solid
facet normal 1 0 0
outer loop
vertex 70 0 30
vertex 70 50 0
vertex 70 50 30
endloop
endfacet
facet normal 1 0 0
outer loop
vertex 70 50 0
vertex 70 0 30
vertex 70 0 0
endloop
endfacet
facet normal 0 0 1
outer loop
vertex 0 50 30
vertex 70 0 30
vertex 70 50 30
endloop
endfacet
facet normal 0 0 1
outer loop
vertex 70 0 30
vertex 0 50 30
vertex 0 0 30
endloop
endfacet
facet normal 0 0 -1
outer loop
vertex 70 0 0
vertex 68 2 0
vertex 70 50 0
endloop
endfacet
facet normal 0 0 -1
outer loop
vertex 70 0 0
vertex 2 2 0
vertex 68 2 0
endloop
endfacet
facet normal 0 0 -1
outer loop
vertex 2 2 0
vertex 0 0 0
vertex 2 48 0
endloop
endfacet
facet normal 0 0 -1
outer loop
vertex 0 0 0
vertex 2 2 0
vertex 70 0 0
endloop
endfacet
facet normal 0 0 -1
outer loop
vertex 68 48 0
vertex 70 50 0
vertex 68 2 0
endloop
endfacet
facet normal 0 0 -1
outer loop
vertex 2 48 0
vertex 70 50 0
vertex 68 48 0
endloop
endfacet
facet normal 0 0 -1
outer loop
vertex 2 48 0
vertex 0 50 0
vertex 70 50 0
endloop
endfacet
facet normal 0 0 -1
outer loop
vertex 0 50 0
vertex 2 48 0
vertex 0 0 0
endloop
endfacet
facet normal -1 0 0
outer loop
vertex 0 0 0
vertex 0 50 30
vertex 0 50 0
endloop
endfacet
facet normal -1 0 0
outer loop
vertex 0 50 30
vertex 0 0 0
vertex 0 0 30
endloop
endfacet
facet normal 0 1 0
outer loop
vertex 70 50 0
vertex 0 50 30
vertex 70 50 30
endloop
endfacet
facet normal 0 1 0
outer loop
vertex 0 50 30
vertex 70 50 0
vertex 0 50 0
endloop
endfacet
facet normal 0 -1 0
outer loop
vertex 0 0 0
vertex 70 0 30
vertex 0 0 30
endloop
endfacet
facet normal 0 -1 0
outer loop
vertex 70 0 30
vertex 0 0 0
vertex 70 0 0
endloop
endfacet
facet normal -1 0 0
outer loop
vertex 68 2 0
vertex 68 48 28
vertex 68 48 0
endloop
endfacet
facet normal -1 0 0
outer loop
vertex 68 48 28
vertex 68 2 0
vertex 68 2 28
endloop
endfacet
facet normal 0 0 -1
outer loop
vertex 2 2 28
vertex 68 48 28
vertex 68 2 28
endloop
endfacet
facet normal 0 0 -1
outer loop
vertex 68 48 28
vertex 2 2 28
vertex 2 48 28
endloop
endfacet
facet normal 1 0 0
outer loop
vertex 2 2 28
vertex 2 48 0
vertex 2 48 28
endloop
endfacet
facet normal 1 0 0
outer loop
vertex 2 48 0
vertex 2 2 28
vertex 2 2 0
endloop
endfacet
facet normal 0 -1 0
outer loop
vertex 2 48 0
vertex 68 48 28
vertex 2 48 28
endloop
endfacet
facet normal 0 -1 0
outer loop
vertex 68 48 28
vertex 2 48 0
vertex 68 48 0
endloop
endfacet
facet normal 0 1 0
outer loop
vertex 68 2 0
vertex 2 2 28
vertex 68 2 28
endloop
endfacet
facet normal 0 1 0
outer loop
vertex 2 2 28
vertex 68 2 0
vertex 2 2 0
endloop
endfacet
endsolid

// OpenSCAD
// Two-part enclosure for small electronics board
// Part 1: Box (left)
// Part 2: Lid (right, printed upside down)
// Prints together with a 10 mm gap.

$fn = 64;

// --- Dimensions ---

// Part 1: Box
// Outer dimensions (X x Y x Z)
BOX_OUT_X = 70;
BOX_OUT_Y = 50;
BOX_OUT_Z = 30;
// Wall thicknesses
BOX_WALL_THICK = 2;
BOX_FLOOR_THICK = 2;

// Part 2: Lid
// Base plate dimensions
LID_PLATE_X = 70;
LID_PLATE_Y = 50;
LID_PLATE_THICK = 2;
// Lip dimensions (outer size of the lip)
LIP_OUT_X = 65.6;
LIP_OUT_Y = 45.6;
LIP_THICK = 1.5;
LIP_HEIGHT = 4;
// Clearance check (calculated from outer sizes)
// Box inner X = 70 - 2*2 = 66. Lip outer X = 65.6. Clearance = (66 - 65.6)/2 = 0.2 mm.
// Box inner Y = 50 - 2*2 = 46. Lip outer Y = 45.6. Clearance = (46 - 45.6)/2 = 0.2 mm.

// --- Layout ---
// Gap between parts
PART_GAP = 10;

// --- Part 1: The Box ---
// Position: Centered on origin in X, Y, Z=0.
// Since it's open top, we build the floor and walls.
// We use difference to subtract the empty interior.

translate([0, 0, 0])
difference() {
    // 1. The solid block representing the outer volume
    cube([BOX_OUT_X, BOX_OUT_Y, BOX_OUT_Z], center = false);
    
    // 2. The empty interior to subtract
    // Inner dimensions:
    // X: 70 - 2*2 = 66
    // Y: 50 - 2*2 = 46
    // Z: 30 - 2 (floor) = 28 (open top)
    translate([
        BOX_WALL_THICK, 
        BOX_WALL_THICK, 
        0 // Floor is at Z=0, so empty space starts at Z=0
    ])
    cube([
        BOX_OUT_X - (2 * BOX_WALL_THICK),
        BOX_OUT_Y - (2 * BOX_WALL_THICK),
        BOX_OUT_Z - BOX_FLOOR_THICK
    ]);
}

// --- Part 2: The Lid ---
// Position: On the +X side of the box.
// Box center X = 35. Box right edge = 70.
// Lid left edge = 70 + 10 = 80.
// Lid center X = 80 + (70/2) = 115.
// Lid is printed upside down: It rests on the bed (Z=0).
// The "plate" is the bottom face (Z=0 to Z=2).
// The "lip" is on top of the plate (Z=2 to Z=6), but since it's upside down, 
// the lip physically sits on the bed? 
// Re-reading prompt: "a plate 70 x 50 x 2 mm lying on the bed, with a rectangular lip on top of it".
// If printed upside down, the "top" of the geometry (where the lip is) is facing the bed?
// No, "printed upside down" usually means the part is inverted relative to its design orientation.
// Design: Plate on bottom, lip on top.
// Print: Plate on top (facing Z+), lip on bottom (facing Z-)? 
// OR: The user wants the part to sit on the bed such that the lip is the bottom-most feature?
// Let's interpret "printed upside down" as: The geometry is flipped vertically.
// Original Design: Plate at Z=0..2, Lip at Z=2..6.
// Upside Down Design: Lip at Z=0..4, Plate at Z=4..6.
// BUT the prompt says: "a plate 70 x 50 x 2 mm lying on the bed".
// This implies the plate is the contact surface with the bed.
// If the plate is on the bed, and there is a lip "on top of it", then the lip is at Z=2..6.
// This contradicts "printed upside down" if the design was plate-bottom.
// Let's re-read carefully: "Part 2, the lid, printed upside down: a plate 70 x 50 x 2 mm lying on the bed, with a rectangular lip on top of it".
// This describes the physical state on the bed.
// Plate is at Z=0. Lip is at Z=2 (thickness 1.5) + height 4 = Z=5.5?
// Wait, "lip on top of it".
// If the plate is on the bed, the lip is above the plate.
// Why "printed upside down"? Maybe the design file usually has the lip on the bottom (for a snap fit)?
// Regardless, the instruction describes the geometry on the bed:
// 1. Plate (70x50x2) at Z=0.
// 2. Lip (1.5 thick wall, 4 tall) on top of the plate.
// 3. Lip outer size 65.6 x 45.6.
// 4. Lip is centred on the plate.
// 5. Lip slides into the box opening.
// Box opening is at the top (Z=28 to Z=30).
// If the lid is placed on the bed (Z=0), how does it slide into the box?
// It must be lifted. The "printed upside down" might refer to the orientation of the lip relative to the box?
// Actually, if the lid is on the bed, and the box is at Z=0..30, the lid must be placed ON TOP of the box.
// If the lid is "printed upside down", maybe the lip is the bottom part of the lid assembly?
// Let's reconsider the "printed upside down" phrase in context of 3D printing enclosures.
// Often, lids are printed with the lip on the bottom so it snaps in.
// If the user says "printed upside down: a plate... lying on the bed, with a rectangular lip on top of it",
// they are describing the visual appearance on the build plate.
// So: Bottom = Plate. Top = Lip.
// This means the lip is the highest point of the lid.
// When closing the box, the lip goes into the box opening.
// This makes sense. The "upside down" might just be a descriptor of how the user visualizes the "lid" part relative to a standard "box" part, or perhaps they mean the lip is the bottom of the *lid component* in a different context, but here they explicitly define the bed orientation.
// Let's stick to the explicit geometric description:
// Bed: Z=0.
// Plate: 70x50x2.
// Lip: On top of plate. Outer 65.6x45.6. Wall 1.5. Height 4.
// Total height = 2 + 1.5 + 4 = 7.5? Or is the 4mm height including the wall thickness?
// "1.5 mm thick wall, 4 mm tall". Usually means the protrusion is 4mm high.
// So Lip top Z = 2 + 1.5 + 4 = 7.5.
// Wait, if the lip is 1.5mm thick wall, does "4mm tall" mean the inner cavity is 4mm deep?
// "rectangular lip ... 4 mm tall". Usually implies the vertical dimension of the lip feature.
// Let's assume the lip protrudes 4mm from the top of the plate.
// So Lip Top Z = 2 + 4 = 6.
// The wall thickness is 1.5mm.
// Let's refine the lip geometry:
// It's a rim.
// Base: 70x50x2.
// Rim: Outer 65.6x45.6.
// The rim sits on the 70x50 plate.
// The rim has a vertical height of 4mm.
// The rim has a thickness of 1.5mm.
// So the rim is a hollow box shape sitting on the plate.
// Inner hole of rim:
// X_inner = 65.6 - 2*1.5 = 62.6.
// Y_inner = 45.6 - 2*1.5 = 42.6.
// Height of rim = 4mm.
// Total height of lid = 2 (
